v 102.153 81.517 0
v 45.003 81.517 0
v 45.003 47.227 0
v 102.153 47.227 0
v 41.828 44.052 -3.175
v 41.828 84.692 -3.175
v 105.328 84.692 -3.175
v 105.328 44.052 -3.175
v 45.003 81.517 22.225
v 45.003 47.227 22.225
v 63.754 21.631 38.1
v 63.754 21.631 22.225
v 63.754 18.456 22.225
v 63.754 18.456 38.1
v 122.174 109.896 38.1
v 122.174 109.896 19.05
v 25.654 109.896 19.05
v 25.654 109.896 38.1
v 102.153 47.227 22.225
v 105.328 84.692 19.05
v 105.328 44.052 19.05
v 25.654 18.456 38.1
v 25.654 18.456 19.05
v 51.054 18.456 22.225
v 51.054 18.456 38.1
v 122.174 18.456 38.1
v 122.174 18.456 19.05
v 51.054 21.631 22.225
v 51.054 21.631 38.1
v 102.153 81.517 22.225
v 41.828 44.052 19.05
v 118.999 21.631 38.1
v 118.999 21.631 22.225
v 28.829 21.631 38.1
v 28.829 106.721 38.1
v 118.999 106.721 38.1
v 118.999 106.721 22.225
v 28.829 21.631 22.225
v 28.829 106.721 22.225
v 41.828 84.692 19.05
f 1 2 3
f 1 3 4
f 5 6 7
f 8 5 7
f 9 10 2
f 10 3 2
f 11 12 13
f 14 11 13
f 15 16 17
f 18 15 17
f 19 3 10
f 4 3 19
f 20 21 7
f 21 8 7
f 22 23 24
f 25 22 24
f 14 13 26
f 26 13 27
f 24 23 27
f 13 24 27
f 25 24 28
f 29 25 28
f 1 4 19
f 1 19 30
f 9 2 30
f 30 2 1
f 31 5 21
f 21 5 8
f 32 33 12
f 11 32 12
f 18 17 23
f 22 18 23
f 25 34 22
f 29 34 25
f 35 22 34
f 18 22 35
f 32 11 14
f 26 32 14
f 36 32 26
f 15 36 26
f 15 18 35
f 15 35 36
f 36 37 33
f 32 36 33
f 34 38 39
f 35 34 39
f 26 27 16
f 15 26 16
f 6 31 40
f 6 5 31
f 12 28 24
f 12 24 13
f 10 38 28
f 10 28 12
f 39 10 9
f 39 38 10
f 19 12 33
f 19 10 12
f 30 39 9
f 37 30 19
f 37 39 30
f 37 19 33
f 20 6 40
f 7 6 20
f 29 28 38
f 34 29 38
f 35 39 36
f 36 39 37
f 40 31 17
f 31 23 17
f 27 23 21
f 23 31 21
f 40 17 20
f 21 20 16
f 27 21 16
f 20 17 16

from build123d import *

# Parameters (mm, degrees)
F0_W     = 63.5
F0_H     = 40.64
F0_W_2   = 57.15
F0_H_2   = 34.29
F1_DEPTH = 3.175
F2_DEPTH = 19.05
F3_W     = 57.15
F3_H     = 34.29
F4_DEPTH = 3.175
F5_DEPTH = 19.05


# Not quite as in the source:
# - a length typed as a fraction of an inch, garbled in the dataset ("3 / 203.2 mm" for 3/8 in), is restored


with BuildPart() as f1:
    # F0 (on Top) → F1 (new body)
    with BuildSketch(Plane.XY):
        with Locations((73.5778744221, 64.3721897411)):
            Rectangle(F0_W, F0_H)
        with Locations((73.5778744221, 64.3721897411)):
            Rectangle(F0_W_2, F0_H_2, mode=Mode.SUBTRACT)
        with Locations((73.5778744221, 64.3721897411)):
            Rectangle(F0_W_2, F0_H_2)
    extrude(amount=-F1_DEPTH)

    # F0 (on Top) → F2 (join)
    with BuildSketch(Plane.XY):
        with Locations((73.5778744221, 64.3721897411)):
            Rectangle(F0_W, F0_H)
        with Locations((73.5778744221, 64.3721897411)):
            Rectangle(F0_W_2, F0_H_2, mode=Mode.SUBTRACT)
    extrude(amount=F2_DEPTH)

    # F3 (on face) → F4 (join)
    with BuildSketch(Plane.XY.offset(19.05)):
        Polygon((25.6539992988, 109.8956785083), (25.6539992988, 18.4556785083), (51.0539992988, 18.4556785083), (51.0539992988, 21.6306785083), (28.8289992988, 21.6306785083), (28.8289992988, 106.7206785083), (118.9989992988, 106.7206785083), (118.9989992988, 21.6306785083), (63.7539992988, 21.6306785083), (63.7539992988, 18.4556785083), (122.1739992988, 18.4556785083), (122.1739992988, 109.8956785083), align=None)
        Polygon((51.0539992988, 21.6306785083), (51.0539992988, 18.4556785083), (63.7539992988, 18.4556785083), (63.7539992988, 21.6306785083), (118.9989992988, 21.6306785083), (118.9989992988, 106.7206785083), (28.8289992988, 106.7206785083), (28.8289992988, 21.6306785083), align=None)
        with Locations((73.5778744221, 64.3721897411)):
            Rectangle(F3_W, F3_H, mode=Mode.SUBTRACT)
    extrude(amount=F4_DEPTH)

    # F3 (on face) → F5 (join)
    with BuildSketch(Plane.XY.offset(19.05)):
        Polygon((25.6539992988, 109.8956785083), (25.6539992988, 18.4556785083), (51.0539992988, 18.4556785083), (51.0539992988, 21.6306785083), (28.8289992988, 21.6306785083), (28.8289992988, 106.7206785083), (118.9989992988, 106.7206785083), (118.9989992988, 21.6306785083), (63.7539992988, 21.6306785083), (63.7539992988, 18.4556785083), (122.1739992988, 18.4556785083), (122.1739992988, 109.8956785083), align=None)
    extrude(amount=F5_DEPTH)


solid = f1.part
